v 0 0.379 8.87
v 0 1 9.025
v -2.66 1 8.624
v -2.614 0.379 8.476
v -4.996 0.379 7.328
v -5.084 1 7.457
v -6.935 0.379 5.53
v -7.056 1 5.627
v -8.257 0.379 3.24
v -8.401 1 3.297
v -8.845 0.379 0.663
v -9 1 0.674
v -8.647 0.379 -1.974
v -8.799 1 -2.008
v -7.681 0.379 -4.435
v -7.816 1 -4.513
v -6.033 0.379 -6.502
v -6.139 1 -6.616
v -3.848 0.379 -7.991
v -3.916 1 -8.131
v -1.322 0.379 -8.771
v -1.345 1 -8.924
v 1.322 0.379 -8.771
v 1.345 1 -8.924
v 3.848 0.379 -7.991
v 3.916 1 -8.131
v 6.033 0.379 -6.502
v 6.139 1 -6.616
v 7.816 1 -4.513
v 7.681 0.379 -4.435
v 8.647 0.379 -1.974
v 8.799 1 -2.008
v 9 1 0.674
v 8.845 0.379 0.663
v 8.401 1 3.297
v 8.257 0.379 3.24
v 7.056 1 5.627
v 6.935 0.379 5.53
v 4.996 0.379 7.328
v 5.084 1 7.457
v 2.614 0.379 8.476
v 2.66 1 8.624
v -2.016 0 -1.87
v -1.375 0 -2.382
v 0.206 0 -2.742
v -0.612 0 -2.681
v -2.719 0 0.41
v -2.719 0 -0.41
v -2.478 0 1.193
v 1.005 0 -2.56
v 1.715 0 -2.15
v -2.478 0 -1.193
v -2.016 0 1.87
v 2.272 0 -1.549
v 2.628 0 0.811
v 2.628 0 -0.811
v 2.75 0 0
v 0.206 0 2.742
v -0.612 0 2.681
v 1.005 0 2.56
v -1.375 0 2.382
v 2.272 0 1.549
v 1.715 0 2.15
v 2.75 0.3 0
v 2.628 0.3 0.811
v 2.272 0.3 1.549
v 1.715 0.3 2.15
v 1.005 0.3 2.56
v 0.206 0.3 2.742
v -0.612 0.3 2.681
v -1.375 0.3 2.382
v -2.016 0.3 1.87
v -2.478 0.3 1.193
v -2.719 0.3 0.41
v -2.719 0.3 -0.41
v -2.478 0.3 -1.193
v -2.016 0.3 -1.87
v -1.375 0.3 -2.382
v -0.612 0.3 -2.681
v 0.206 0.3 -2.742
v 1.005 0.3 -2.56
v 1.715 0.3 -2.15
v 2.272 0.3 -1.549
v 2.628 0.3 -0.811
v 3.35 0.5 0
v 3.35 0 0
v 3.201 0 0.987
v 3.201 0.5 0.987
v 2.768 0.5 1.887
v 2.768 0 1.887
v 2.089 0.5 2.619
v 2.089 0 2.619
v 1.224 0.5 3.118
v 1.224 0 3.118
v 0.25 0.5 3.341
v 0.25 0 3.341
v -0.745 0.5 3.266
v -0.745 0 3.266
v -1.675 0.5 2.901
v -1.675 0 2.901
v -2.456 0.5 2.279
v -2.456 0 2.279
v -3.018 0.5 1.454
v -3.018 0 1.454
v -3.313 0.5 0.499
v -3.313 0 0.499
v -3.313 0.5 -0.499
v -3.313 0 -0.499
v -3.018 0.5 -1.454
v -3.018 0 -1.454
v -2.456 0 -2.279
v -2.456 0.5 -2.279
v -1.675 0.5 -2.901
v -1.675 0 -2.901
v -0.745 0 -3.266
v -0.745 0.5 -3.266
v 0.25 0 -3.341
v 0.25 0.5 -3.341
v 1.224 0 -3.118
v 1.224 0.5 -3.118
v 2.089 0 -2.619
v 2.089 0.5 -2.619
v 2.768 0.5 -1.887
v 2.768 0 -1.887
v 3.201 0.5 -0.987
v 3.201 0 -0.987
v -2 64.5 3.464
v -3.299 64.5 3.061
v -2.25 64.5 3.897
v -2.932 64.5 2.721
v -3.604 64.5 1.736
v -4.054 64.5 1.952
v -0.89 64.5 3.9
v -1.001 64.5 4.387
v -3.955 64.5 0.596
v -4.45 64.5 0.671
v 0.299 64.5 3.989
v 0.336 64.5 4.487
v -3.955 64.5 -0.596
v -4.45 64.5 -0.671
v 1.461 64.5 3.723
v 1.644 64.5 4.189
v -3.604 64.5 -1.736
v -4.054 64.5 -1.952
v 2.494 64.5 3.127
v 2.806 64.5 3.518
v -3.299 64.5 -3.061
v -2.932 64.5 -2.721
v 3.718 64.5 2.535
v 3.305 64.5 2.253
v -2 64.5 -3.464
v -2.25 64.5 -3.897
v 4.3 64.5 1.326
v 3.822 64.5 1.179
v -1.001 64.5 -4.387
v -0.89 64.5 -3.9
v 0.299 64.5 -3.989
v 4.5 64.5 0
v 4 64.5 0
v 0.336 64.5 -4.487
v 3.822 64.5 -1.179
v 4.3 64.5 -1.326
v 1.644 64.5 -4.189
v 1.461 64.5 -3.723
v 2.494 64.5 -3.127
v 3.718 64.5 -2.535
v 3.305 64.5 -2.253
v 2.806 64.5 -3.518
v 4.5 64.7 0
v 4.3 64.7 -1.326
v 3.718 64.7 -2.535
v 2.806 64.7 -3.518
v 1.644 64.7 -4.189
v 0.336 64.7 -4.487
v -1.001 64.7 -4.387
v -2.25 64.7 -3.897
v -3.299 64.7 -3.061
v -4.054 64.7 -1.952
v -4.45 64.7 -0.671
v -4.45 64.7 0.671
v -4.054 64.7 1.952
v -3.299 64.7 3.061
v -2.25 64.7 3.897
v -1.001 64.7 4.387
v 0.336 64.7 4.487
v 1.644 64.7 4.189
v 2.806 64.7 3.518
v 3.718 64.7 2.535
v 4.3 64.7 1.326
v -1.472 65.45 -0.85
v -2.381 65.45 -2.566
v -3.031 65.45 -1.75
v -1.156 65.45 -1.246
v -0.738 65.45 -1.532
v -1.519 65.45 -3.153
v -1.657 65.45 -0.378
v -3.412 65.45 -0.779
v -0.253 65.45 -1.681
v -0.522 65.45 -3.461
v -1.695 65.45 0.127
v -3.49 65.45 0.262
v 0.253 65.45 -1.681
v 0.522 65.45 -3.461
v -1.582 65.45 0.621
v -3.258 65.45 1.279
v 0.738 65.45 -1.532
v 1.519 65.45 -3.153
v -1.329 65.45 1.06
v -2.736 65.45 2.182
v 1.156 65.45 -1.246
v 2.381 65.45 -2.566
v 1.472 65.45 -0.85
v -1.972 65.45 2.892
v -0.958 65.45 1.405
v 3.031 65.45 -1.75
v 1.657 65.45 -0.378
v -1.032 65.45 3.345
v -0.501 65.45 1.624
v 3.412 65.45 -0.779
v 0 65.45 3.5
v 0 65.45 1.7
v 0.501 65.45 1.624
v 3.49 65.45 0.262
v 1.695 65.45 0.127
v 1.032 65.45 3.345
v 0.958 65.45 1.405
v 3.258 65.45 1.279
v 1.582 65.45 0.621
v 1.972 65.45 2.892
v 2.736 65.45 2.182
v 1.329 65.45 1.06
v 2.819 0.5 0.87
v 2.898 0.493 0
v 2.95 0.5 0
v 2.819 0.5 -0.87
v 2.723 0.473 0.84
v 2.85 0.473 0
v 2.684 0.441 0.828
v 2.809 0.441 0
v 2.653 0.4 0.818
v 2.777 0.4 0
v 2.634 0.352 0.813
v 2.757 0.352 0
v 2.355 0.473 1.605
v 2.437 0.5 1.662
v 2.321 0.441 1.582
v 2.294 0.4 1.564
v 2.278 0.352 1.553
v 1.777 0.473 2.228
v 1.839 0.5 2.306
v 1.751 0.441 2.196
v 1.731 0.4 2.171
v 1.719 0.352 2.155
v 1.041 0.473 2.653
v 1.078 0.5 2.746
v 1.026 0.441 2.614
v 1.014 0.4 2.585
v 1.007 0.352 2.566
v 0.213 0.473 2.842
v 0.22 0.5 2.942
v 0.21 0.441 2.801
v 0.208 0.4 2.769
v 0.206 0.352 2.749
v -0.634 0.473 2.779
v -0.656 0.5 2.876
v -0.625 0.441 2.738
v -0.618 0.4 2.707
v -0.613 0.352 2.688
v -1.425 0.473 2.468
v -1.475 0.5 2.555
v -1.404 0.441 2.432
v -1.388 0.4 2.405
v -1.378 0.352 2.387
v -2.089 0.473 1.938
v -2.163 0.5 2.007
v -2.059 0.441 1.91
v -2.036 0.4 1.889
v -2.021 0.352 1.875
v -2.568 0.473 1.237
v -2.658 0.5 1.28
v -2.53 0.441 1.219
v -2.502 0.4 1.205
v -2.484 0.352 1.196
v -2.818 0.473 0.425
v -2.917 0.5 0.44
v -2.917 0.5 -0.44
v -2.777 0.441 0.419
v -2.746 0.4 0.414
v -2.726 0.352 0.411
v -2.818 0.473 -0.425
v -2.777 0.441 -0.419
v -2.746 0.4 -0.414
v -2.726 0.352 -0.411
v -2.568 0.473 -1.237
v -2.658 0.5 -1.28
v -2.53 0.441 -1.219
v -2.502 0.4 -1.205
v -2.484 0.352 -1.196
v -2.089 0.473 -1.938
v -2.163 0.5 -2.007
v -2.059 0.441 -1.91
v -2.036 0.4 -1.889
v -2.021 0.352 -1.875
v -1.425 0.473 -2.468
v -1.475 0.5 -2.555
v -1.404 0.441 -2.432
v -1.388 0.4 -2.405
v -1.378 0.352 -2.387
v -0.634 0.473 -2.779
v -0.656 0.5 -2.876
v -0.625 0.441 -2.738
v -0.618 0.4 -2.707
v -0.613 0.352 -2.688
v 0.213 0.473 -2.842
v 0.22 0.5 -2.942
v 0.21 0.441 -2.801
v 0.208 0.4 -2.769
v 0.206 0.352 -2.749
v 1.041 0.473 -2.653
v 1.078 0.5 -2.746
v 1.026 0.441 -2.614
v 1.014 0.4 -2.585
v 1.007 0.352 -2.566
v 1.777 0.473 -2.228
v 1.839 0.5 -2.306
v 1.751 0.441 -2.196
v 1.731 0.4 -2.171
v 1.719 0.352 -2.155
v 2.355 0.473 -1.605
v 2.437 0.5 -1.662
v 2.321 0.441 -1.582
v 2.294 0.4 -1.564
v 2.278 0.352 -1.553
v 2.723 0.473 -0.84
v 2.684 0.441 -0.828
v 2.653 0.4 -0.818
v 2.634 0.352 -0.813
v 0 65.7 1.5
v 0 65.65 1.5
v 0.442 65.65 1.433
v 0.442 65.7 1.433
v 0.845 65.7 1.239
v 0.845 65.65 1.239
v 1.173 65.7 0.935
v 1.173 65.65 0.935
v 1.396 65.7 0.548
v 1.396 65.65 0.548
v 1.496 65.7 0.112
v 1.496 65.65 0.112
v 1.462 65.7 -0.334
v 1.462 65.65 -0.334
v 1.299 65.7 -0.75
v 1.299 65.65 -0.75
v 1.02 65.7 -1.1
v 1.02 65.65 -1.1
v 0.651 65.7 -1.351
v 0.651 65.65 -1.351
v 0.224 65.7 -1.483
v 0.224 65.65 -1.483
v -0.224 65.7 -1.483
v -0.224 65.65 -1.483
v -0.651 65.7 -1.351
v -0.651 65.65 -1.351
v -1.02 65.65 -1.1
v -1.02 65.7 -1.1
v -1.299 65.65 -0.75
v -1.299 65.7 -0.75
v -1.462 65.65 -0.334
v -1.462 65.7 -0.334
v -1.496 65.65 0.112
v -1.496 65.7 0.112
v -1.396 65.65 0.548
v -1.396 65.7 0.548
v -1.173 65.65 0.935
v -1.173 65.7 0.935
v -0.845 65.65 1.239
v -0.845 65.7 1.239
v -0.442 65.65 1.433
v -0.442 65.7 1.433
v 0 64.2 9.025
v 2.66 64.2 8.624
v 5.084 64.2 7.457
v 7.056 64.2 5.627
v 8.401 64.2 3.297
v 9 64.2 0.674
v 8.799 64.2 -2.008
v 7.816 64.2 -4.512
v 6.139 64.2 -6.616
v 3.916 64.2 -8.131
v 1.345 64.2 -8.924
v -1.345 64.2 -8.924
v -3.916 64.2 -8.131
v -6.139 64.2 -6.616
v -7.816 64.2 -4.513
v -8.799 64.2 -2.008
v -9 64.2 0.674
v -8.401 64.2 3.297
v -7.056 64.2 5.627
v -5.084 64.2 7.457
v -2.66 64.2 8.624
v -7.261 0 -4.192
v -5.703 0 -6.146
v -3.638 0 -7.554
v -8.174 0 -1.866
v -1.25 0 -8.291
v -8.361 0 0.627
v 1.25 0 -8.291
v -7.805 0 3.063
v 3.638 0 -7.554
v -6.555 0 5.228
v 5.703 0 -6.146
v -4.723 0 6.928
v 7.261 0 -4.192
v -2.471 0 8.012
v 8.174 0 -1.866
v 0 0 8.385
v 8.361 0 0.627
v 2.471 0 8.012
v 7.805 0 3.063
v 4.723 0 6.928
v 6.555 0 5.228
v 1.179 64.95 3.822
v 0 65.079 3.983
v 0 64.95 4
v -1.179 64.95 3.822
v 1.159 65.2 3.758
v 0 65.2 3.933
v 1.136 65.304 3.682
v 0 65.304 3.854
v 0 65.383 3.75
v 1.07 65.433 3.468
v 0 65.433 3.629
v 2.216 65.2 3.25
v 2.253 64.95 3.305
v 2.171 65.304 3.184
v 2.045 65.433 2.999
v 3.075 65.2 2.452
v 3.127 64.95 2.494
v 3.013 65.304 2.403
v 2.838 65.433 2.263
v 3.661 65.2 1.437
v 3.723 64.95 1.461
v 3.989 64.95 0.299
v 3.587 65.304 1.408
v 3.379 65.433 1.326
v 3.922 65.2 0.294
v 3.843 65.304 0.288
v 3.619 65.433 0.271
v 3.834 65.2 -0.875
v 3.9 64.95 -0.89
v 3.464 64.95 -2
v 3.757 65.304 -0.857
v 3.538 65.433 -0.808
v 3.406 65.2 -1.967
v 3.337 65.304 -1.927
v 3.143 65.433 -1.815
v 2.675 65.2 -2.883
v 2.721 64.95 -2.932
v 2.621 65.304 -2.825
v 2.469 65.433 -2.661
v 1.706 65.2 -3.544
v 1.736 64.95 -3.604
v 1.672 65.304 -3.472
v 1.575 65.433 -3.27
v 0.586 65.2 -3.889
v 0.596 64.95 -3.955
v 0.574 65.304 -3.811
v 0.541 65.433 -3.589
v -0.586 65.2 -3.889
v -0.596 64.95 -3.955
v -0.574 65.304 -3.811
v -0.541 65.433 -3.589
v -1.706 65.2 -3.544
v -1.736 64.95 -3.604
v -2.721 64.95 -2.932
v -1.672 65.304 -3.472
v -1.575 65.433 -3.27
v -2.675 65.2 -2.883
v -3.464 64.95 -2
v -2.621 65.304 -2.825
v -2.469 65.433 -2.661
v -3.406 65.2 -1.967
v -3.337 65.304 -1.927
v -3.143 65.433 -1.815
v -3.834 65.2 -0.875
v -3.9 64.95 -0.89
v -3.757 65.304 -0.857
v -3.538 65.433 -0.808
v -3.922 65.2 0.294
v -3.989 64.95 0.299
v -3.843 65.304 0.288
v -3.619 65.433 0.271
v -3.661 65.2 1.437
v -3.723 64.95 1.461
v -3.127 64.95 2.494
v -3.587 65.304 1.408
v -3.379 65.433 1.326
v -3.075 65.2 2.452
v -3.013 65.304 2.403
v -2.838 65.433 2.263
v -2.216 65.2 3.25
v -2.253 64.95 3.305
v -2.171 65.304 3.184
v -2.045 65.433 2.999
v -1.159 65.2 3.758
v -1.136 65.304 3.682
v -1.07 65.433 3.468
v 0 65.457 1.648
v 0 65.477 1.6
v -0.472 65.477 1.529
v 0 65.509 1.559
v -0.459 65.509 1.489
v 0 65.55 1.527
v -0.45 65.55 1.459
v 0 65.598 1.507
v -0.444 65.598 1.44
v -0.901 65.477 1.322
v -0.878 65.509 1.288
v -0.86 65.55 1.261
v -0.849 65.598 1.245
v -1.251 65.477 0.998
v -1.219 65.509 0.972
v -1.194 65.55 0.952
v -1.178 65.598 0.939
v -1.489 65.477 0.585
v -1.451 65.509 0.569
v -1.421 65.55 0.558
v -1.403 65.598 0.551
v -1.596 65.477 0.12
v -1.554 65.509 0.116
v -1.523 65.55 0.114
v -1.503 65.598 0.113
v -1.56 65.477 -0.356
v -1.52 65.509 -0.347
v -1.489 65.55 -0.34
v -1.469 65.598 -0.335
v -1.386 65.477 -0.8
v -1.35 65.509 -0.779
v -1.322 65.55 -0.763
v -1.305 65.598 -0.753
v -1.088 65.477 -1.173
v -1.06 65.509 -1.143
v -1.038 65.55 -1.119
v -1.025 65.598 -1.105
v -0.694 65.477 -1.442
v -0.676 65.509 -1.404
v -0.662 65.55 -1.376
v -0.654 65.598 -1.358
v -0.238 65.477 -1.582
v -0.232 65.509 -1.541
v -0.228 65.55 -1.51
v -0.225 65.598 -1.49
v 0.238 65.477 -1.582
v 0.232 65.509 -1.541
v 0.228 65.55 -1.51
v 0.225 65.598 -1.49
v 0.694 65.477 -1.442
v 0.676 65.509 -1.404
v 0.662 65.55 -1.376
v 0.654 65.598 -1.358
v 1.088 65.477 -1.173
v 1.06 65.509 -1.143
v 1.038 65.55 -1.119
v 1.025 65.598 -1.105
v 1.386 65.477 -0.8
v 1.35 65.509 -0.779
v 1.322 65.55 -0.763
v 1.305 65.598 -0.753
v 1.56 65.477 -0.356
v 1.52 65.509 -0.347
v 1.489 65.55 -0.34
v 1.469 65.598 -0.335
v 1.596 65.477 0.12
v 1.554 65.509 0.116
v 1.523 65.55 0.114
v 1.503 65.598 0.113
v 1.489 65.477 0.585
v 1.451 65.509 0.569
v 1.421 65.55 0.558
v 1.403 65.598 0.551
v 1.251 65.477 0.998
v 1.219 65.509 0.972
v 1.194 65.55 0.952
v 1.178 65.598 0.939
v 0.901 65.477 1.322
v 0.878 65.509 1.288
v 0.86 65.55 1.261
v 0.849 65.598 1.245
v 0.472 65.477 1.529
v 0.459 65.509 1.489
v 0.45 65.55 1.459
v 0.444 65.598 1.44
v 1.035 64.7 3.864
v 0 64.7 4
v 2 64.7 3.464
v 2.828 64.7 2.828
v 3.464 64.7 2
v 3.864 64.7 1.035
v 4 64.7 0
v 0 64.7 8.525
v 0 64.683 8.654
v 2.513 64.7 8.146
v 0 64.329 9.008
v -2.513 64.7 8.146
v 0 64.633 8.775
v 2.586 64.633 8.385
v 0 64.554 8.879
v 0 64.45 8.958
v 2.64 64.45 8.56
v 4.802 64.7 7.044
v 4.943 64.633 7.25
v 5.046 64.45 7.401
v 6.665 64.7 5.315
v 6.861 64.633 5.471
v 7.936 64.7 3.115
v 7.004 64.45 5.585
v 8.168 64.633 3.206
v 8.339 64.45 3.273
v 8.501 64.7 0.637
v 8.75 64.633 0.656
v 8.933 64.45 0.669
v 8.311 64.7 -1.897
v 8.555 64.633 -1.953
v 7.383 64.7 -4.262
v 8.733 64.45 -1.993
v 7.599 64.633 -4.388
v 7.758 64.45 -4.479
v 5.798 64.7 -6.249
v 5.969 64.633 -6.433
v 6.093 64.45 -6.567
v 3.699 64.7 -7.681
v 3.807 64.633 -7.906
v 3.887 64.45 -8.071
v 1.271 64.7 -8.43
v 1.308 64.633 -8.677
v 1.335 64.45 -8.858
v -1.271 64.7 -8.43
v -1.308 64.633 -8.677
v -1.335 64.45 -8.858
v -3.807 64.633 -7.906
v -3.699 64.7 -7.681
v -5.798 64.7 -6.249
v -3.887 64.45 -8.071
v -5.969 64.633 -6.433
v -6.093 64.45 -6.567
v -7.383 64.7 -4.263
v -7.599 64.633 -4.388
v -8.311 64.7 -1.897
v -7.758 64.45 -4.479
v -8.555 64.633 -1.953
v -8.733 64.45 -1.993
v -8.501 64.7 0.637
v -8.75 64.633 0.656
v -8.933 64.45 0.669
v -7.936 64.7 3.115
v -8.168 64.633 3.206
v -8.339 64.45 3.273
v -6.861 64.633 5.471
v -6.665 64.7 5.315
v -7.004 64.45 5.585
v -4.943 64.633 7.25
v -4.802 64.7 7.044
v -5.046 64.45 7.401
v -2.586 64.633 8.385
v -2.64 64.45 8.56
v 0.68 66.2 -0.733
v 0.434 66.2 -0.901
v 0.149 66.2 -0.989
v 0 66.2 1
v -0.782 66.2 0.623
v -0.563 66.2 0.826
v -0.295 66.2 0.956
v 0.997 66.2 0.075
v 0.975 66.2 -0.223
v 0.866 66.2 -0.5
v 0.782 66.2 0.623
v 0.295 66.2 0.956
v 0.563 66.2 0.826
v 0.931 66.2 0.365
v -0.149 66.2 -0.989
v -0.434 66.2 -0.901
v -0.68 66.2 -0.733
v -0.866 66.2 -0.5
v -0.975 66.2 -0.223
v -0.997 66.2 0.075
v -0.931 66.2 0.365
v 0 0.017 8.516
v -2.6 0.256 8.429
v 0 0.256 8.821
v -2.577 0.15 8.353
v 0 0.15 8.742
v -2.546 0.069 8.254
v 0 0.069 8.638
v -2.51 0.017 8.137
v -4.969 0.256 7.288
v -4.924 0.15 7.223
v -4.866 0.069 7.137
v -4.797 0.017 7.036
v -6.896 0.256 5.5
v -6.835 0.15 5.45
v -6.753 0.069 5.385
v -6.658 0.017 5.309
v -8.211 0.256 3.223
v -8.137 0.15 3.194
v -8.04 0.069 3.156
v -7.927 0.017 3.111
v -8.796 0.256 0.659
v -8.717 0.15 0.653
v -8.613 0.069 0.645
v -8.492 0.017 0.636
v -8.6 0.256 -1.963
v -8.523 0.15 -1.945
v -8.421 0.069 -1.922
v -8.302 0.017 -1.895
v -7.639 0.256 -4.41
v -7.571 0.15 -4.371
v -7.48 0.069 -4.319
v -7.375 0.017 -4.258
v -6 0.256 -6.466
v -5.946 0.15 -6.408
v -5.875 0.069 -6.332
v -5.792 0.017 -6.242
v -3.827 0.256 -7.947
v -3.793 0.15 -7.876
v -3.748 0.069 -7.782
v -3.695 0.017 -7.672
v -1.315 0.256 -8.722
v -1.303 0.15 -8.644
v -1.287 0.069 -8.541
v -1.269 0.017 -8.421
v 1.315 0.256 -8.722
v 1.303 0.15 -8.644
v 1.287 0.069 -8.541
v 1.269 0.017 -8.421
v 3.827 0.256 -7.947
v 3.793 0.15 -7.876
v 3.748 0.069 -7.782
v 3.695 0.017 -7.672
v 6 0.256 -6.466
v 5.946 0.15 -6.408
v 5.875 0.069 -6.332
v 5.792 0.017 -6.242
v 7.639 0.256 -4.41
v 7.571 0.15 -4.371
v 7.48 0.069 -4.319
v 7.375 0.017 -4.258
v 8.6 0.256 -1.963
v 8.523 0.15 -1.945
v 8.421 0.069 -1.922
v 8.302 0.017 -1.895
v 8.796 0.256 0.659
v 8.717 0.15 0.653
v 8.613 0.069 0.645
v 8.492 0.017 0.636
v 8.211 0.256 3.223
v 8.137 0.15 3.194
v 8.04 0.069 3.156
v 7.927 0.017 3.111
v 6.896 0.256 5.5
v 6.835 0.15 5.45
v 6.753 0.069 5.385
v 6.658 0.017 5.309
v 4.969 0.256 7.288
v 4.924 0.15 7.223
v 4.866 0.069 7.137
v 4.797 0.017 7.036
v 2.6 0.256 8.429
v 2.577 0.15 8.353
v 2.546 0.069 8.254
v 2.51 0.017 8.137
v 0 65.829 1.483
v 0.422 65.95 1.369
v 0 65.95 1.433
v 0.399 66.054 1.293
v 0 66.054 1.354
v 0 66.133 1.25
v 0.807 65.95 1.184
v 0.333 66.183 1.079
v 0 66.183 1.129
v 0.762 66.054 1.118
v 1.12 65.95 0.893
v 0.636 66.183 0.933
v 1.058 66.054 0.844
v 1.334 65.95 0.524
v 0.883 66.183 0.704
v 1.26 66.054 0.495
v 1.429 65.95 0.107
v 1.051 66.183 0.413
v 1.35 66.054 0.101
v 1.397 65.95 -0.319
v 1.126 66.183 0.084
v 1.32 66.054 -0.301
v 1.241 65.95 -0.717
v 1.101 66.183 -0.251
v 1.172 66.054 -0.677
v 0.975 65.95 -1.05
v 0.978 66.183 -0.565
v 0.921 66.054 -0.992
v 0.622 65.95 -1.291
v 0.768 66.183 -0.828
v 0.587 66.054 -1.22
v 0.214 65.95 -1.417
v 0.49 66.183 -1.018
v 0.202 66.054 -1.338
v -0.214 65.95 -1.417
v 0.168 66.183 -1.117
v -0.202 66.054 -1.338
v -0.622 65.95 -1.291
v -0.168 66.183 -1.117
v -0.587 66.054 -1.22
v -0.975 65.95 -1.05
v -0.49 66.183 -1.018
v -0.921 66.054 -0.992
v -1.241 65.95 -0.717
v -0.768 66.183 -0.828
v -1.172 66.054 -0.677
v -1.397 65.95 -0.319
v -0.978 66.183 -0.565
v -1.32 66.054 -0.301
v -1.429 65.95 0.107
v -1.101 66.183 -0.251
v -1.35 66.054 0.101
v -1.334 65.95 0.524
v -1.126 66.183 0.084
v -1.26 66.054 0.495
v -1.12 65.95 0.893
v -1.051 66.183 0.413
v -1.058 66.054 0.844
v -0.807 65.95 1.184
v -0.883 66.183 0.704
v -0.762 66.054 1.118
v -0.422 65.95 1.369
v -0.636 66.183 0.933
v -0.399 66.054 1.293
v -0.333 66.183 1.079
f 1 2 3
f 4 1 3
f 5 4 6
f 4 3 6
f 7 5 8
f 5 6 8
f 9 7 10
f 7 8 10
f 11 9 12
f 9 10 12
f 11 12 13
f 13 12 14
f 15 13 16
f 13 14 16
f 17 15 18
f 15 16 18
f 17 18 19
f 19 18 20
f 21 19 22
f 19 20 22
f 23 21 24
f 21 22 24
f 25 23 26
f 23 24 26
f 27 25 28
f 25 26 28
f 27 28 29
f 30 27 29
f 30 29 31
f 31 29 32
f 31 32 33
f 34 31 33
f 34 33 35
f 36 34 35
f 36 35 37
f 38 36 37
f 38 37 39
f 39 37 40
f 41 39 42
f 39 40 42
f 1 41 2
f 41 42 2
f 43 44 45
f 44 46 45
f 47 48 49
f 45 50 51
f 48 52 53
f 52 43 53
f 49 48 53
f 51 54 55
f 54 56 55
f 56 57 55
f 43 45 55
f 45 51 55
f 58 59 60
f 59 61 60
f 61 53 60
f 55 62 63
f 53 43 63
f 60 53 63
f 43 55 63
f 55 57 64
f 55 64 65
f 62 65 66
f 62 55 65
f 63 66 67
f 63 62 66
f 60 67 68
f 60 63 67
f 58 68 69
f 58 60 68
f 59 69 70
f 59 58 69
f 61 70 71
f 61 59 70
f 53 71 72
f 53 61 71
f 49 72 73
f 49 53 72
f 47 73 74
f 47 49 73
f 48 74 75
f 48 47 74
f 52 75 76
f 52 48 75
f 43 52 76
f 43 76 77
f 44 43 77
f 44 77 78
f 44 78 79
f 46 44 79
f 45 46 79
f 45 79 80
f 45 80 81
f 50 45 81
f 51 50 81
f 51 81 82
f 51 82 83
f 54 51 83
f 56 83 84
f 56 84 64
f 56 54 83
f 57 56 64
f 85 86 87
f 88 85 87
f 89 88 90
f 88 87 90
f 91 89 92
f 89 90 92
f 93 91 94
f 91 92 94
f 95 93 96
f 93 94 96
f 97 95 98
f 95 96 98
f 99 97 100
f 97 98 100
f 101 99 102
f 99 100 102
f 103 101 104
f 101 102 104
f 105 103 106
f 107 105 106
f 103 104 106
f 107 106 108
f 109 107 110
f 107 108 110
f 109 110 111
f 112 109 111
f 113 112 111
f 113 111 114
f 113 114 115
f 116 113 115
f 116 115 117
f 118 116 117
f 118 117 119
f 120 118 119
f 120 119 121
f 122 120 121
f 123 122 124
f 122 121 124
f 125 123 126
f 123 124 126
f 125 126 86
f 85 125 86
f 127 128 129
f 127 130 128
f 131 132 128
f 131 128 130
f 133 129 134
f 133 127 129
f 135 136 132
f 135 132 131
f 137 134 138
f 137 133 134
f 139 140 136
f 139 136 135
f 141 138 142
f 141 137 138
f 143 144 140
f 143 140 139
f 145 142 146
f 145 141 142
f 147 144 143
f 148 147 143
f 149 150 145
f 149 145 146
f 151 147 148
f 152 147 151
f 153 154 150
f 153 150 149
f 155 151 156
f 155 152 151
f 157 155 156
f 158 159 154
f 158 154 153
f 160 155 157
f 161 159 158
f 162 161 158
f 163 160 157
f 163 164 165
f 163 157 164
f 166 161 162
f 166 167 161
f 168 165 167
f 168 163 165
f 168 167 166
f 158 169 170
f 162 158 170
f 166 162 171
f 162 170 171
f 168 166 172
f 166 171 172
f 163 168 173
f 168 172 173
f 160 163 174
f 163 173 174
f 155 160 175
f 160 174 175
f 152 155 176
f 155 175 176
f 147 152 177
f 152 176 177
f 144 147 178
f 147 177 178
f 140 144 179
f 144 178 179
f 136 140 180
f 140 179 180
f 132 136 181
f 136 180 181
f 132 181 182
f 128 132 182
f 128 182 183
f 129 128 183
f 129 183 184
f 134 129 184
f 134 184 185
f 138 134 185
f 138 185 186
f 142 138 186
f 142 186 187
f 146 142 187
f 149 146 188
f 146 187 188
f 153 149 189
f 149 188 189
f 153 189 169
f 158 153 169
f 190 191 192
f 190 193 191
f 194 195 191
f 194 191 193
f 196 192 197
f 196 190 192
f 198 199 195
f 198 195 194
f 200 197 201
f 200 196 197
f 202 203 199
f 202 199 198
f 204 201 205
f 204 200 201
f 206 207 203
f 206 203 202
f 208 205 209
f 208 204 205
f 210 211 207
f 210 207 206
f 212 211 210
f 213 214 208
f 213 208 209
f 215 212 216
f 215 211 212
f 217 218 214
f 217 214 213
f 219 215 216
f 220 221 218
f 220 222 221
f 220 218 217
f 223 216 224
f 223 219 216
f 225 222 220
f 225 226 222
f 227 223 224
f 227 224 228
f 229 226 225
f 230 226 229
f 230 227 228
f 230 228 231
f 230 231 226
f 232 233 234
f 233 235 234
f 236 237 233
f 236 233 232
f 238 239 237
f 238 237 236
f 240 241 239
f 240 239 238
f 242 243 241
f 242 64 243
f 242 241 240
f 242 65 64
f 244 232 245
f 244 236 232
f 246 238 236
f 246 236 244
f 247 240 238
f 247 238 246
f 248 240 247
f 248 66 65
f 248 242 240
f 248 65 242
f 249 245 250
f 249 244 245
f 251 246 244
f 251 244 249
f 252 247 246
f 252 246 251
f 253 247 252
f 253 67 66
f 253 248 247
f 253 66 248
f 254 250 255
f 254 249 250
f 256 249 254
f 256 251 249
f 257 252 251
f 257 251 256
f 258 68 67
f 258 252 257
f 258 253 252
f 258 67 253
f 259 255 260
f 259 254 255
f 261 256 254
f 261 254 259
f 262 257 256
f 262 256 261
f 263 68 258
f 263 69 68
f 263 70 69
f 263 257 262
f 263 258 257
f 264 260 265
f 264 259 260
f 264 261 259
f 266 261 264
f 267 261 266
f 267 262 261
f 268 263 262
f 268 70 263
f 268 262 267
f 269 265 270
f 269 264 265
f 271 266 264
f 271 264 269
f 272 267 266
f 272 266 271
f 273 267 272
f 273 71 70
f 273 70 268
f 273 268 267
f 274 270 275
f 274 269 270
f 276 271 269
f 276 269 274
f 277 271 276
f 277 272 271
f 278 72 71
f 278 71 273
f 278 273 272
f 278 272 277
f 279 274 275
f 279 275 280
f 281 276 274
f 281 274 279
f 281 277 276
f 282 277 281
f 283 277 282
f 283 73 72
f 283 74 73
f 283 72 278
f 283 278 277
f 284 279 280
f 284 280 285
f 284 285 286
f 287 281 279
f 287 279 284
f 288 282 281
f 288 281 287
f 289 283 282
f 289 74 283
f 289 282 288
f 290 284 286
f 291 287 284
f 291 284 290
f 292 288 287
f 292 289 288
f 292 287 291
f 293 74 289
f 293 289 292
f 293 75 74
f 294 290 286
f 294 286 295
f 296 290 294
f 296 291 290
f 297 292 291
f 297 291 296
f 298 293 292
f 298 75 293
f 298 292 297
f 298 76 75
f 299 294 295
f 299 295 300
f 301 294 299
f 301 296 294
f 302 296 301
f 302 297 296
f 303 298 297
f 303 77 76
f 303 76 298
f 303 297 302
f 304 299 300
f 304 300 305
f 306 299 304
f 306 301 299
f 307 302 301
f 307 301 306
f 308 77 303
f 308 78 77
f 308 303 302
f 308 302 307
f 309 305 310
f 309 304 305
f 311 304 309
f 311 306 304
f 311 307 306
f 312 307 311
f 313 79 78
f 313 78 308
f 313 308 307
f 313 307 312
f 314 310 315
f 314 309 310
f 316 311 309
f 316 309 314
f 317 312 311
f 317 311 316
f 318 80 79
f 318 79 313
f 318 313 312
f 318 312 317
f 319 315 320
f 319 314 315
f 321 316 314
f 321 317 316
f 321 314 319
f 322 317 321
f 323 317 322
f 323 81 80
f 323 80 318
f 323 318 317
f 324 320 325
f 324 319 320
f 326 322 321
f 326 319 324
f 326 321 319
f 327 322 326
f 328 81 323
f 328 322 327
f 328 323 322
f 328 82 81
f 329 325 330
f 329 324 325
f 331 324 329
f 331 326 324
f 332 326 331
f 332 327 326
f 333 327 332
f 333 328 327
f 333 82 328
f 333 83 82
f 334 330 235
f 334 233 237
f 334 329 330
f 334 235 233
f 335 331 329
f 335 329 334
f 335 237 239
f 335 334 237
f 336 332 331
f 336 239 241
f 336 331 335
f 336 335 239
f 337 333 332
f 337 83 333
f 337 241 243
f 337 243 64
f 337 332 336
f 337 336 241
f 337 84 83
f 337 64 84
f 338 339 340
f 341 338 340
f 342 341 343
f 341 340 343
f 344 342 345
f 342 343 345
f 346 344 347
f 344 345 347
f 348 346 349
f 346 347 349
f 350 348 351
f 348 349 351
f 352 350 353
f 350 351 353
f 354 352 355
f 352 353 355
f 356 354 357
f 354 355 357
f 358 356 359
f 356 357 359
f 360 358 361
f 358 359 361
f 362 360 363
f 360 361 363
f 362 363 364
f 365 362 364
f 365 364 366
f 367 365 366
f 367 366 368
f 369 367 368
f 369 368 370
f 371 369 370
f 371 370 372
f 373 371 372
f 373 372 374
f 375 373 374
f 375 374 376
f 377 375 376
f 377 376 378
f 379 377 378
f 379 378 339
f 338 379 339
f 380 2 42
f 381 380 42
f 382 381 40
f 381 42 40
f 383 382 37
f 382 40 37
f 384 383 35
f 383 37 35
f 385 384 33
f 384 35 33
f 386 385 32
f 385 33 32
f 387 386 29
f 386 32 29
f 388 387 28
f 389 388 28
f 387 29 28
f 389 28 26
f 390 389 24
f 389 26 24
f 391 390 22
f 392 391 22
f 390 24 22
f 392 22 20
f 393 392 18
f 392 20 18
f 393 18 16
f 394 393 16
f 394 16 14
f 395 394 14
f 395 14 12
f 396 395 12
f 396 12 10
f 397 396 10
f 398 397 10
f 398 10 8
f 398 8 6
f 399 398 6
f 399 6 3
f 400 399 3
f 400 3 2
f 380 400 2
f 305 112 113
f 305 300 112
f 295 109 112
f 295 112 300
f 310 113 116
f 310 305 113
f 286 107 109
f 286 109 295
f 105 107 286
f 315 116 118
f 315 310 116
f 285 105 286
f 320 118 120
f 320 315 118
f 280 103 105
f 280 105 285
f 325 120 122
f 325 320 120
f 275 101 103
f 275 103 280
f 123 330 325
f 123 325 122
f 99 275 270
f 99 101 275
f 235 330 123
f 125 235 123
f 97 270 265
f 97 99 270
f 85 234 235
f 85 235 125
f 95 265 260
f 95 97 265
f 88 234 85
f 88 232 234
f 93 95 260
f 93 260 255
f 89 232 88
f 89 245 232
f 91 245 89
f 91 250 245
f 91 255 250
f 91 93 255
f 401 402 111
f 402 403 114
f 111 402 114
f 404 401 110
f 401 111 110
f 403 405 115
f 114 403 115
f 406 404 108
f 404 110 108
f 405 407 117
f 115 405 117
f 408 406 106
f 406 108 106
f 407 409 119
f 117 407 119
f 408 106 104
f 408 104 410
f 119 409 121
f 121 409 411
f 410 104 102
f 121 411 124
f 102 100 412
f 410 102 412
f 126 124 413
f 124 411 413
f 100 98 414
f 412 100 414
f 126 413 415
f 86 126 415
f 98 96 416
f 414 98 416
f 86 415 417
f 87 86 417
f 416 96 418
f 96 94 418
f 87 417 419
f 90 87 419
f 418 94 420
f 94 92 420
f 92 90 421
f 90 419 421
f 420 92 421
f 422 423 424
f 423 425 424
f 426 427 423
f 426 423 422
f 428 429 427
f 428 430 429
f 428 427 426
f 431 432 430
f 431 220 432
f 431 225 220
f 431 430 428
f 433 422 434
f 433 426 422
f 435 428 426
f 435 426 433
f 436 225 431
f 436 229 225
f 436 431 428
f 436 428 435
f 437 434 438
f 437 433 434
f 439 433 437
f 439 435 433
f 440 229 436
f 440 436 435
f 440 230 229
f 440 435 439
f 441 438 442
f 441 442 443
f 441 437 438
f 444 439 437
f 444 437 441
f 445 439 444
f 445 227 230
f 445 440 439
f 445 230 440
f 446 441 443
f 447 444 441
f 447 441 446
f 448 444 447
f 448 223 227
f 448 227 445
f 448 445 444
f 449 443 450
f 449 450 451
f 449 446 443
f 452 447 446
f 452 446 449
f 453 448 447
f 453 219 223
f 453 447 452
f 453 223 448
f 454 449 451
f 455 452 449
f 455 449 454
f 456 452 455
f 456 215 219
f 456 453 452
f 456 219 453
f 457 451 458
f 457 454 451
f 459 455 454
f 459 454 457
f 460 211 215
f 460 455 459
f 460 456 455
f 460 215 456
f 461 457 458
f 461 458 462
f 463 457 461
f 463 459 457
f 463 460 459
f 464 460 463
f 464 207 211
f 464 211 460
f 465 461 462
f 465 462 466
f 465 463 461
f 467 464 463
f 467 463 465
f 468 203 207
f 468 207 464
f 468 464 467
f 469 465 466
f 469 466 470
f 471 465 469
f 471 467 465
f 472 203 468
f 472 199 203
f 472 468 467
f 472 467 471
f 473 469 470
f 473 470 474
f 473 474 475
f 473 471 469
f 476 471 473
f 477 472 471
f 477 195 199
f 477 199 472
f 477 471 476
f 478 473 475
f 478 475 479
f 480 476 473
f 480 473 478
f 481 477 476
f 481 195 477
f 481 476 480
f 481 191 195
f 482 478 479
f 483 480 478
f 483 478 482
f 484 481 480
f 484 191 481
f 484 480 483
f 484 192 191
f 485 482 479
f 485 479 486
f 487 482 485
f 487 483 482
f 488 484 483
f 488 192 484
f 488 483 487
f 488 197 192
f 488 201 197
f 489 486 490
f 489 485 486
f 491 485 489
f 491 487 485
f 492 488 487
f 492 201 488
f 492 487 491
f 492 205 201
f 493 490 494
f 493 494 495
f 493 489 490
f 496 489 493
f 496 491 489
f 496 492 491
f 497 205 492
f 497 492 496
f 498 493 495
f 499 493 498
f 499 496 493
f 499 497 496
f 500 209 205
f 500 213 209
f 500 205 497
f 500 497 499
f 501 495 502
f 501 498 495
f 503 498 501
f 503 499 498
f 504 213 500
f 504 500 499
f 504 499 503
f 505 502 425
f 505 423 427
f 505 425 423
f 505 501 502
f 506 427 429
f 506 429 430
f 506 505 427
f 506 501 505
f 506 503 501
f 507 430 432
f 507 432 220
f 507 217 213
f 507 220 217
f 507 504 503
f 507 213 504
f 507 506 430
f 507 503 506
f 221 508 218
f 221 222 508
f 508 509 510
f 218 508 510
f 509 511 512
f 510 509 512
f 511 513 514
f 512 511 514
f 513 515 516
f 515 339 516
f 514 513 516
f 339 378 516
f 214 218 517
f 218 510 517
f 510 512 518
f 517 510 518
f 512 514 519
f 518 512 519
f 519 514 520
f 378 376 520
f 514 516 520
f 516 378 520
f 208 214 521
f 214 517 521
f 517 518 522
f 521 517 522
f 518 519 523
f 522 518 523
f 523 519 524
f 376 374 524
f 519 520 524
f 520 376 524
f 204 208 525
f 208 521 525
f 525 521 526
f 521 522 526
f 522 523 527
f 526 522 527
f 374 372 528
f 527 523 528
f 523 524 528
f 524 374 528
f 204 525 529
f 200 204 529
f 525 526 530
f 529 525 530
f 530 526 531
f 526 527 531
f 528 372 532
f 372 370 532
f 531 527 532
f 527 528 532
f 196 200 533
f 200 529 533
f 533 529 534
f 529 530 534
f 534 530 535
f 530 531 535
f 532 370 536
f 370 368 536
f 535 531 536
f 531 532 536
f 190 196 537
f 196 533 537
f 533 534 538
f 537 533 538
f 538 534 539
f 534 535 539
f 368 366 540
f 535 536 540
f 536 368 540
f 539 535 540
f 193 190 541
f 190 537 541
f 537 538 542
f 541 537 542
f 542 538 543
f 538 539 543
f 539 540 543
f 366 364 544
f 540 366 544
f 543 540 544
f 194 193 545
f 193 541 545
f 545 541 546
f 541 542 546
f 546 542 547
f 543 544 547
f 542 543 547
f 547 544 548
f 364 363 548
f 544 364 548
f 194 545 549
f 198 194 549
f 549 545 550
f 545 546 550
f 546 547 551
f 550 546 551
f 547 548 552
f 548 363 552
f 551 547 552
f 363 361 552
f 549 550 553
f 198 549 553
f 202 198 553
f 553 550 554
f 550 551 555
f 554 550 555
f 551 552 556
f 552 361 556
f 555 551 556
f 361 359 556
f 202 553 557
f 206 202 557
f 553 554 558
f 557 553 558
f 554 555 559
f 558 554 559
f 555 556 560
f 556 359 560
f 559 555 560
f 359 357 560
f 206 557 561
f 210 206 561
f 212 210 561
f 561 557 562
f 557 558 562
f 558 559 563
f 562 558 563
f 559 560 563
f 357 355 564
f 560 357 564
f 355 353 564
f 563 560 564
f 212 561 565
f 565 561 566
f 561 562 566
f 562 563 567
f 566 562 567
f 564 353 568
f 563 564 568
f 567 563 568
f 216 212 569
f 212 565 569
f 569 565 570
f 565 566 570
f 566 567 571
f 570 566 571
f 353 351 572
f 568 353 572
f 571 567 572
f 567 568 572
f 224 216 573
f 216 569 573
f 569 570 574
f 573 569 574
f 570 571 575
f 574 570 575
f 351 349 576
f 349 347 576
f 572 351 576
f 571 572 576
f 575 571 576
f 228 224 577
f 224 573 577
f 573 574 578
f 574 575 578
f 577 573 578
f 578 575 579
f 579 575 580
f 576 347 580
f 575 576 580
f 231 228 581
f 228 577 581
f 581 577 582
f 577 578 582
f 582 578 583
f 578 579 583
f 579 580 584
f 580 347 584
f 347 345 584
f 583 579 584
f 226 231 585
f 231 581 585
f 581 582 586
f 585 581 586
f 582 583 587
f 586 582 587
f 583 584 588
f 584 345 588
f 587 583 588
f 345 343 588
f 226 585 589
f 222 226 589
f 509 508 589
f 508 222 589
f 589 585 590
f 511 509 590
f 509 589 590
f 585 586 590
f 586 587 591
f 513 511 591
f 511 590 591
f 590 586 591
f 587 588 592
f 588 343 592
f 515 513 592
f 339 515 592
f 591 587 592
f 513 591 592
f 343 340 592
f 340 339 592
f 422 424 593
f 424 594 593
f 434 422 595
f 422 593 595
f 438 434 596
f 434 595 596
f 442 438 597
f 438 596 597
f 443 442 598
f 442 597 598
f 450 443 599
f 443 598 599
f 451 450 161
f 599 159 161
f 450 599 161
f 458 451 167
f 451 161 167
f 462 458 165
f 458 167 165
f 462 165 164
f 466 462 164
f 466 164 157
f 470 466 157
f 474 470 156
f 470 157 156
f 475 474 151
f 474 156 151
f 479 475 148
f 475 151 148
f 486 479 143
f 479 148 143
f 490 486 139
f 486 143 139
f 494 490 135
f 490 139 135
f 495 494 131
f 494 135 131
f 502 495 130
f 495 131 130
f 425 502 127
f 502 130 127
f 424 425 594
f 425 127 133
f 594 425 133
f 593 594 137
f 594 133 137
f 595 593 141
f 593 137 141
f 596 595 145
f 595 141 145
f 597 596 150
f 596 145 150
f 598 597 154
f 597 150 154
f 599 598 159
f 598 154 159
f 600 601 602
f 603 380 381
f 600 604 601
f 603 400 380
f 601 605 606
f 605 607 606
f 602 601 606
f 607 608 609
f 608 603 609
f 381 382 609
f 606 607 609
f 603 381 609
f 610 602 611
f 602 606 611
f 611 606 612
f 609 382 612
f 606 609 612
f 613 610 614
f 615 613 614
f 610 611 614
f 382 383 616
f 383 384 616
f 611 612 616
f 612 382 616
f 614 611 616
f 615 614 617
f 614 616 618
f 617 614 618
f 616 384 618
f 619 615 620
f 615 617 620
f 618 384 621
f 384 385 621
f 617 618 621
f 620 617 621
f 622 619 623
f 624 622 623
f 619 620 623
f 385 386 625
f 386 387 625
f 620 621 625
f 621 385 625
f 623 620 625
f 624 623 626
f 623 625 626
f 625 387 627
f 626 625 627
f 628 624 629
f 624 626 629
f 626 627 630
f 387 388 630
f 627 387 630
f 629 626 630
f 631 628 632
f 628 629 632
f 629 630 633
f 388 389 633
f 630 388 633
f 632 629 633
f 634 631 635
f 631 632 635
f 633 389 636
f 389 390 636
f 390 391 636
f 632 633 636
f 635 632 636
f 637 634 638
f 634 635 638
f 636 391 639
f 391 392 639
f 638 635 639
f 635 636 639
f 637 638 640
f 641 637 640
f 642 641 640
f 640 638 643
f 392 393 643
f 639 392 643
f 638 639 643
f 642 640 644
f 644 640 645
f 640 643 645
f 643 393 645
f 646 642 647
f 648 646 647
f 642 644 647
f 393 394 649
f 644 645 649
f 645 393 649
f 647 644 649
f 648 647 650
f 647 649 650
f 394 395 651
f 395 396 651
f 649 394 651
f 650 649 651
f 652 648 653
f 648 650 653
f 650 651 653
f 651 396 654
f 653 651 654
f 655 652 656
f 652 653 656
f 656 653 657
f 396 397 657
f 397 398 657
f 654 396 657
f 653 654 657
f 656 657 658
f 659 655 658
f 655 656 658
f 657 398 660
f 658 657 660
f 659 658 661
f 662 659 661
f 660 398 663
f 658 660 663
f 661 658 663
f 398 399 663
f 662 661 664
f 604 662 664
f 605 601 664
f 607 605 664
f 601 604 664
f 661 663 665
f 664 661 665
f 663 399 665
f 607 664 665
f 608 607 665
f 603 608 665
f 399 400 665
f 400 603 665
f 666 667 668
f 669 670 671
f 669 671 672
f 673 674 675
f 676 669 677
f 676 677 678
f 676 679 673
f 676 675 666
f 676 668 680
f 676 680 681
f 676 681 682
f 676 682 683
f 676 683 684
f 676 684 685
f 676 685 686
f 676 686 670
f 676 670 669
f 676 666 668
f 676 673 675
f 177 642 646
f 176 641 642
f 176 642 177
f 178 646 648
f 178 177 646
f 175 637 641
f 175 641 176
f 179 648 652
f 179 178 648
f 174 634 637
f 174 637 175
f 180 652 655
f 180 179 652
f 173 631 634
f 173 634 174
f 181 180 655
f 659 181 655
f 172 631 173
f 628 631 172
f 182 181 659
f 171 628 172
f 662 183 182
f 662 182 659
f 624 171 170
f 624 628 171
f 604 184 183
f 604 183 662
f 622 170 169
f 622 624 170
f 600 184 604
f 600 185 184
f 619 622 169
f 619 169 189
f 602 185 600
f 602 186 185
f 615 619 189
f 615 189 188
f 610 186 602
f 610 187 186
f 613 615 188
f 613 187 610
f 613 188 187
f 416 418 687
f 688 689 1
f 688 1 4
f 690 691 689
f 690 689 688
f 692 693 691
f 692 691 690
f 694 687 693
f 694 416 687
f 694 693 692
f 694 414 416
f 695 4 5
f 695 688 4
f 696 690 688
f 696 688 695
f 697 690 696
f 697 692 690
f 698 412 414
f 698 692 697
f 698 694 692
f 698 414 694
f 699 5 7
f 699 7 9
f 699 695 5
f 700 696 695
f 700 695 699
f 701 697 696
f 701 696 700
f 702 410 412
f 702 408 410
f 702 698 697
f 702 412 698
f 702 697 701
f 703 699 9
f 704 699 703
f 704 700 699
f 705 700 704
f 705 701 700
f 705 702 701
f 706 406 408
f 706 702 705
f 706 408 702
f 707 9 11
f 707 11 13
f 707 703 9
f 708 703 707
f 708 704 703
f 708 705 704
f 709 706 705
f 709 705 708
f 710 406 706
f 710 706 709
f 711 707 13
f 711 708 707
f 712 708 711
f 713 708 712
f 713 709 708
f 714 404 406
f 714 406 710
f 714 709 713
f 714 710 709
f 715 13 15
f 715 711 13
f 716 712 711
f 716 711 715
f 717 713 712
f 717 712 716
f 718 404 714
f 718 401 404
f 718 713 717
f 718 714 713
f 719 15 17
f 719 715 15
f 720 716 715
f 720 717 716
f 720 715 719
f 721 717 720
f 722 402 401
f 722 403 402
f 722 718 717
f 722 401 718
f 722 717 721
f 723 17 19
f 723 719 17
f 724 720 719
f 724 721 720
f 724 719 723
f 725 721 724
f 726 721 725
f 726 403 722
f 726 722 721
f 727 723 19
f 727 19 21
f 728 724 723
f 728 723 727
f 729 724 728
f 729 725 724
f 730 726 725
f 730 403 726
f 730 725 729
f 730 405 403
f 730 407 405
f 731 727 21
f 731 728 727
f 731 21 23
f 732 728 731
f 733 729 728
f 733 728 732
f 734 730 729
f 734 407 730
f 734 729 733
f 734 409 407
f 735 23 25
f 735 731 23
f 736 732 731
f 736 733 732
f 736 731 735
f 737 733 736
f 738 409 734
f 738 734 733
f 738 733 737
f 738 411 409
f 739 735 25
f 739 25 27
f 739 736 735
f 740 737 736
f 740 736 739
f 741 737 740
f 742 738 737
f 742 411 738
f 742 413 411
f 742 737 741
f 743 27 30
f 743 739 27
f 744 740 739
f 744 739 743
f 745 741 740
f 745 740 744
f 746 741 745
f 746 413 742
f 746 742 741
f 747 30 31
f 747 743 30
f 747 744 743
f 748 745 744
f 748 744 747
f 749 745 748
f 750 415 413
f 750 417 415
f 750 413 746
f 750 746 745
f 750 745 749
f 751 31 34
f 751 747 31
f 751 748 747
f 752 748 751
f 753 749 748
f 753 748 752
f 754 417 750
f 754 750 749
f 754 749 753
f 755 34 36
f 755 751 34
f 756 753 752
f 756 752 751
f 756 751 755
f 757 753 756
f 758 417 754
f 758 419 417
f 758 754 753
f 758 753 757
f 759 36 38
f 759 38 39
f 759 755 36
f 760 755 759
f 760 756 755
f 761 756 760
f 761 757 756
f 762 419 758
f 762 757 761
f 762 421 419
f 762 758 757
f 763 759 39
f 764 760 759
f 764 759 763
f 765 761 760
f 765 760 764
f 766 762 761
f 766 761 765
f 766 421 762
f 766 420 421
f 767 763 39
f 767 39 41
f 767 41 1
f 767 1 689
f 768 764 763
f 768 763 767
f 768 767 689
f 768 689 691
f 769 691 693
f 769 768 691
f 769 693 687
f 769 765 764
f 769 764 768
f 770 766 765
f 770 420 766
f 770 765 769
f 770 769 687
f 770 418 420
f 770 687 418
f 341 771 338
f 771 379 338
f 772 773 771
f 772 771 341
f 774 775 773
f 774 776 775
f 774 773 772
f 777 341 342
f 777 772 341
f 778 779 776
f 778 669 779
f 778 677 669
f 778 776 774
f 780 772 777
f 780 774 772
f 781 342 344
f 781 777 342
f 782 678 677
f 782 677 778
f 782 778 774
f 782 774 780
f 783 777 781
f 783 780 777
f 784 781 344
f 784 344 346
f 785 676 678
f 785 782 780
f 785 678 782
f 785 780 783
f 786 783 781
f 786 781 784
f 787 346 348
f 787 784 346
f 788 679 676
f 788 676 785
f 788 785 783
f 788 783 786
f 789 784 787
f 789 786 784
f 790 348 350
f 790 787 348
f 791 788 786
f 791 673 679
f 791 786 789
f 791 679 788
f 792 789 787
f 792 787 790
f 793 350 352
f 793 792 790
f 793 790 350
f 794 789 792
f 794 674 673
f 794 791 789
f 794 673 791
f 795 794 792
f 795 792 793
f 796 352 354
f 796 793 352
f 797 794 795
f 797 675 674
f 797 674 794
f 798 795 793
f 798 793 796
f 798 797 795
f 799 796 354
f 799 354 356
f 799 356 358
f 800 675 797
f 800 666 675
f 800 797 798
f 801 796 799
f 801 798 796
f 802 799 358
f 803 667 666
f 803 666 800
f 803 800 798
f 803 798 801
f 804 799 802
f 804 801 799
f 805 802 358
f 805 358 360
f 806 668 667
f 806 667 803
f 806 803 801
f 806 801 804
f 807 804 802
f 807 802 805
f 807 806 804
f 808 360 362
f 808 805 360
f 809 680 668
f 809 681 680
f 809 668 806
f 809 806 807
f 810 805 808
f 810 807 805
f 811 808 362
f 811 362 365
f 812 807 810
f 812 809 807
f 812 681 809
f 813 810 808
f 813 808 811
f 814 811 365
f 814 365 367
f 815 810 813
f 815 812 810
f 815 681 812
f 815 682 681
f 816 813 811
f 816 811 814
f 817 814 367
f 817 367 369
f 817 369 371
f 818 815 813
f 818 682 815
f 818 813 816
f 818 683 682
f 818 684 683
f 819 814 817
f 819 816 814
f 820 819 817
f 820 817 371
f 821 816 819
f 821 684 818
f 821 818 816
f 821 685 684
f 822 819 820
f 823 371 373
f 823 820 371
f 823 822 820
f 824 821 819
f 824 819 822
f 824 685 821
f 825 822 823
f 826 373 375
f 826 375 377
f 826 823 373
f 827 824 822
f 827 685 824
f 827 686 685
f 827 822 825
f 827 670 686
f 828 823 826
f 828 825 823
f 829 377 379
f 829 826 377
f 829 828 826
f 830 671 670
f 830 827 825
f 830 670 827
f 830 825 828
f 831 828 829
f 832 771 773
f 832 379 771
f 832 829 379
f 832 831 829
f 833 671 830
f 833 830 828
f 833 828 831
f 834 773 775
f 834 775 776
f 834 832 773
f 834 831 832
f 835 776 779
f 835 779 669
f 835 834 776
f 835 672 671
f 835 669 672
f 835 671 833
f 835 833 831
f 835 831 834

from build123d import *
from build123d.topology import SkipClean

# Parameters (mm, degrees)
SKETCH1_R      = 9.025
BASE_DEPTH     = 64.7
SKETCH7_R      = 4.5
SKETCH7_R_2    = 4
RIM_DEPTH      = 0.2
SKETCH2_R      = 1.5
TERMINAL_DEPTH = 1.5
SKETCH6_R      = 4
STEP_DEPTH     = 0.75
SKETCH3_R      = 3.35
SKETCH3_R_2    = 2.75
RIM_2_DEPTH    = 0.5
OUTER_FILLET_R = 0.5
INNER_FILLET_R = 0.2


with BuildPart() as part:
    # Sketch1 → Base (new body)
    with BuildSketch(Plane(origin=(0, 0, 0), x_dir=(1, 0, 0), z_dir=(0, 1, 0))):
        with Locations(Location((0, 0, 0), (0, 0, 270))):  # turned: the seam where the file's is
            Circle(SKETCH1_R)
    extrude(amount=BASE_DEPTH)

    # Sketch7 → Rim (cut)
    with BuildSketch(Plane(origin=(0, 64.7, 0), x_dir=(1, 0, 0), z_dir=(0, 1, 0))):
        Circle(SKETCH7_R)
        Circle(SKETCH7_R_2, mode=Mode.SUBTRACT)
    extrude(amount=-RIM_DEPTH, mode=Mode.SUBTRACT)

    # Sketch2 → Terminal (add)
    with BuildSketch(Plane(origin=(0, 64.7, 0), x_dir=(1, 0, 0), z_dir=(0, 1, 0))):
        with Locations(Location((0, 0, 0), (0, 0, 270))):  # turned: the seam where the file's is
            Circle(SKETCH2_R)
    extrude(amount=TERMINAL_DEPTH)

    # Sketch6 → Step (add)
    with SkipClean():  # keep this step's faces unmerged: merging them makes the solid invalid here
        with BuildSketch(Plane(origin=(0, 64.7, 0), x_dir=(1, 0, 0), z_dir=(0, 1, 0))):
            with Locations(Location((0, 0, 0), (0, 0, 270))):  # turned: the seam where the file's is
                Circle(SKETCH6_R)
        extrude(amount=STEP_DEPTH)

    # Sketch8 → Drop Off (revolve, cut)
    with SkipClean():  # keep this step's faces unmerged: merging them makes the solid invalid here
        with BuildSketch(Plane(origin=(0, 0, 0), x_dir=(0, 0, -1), z_dir=(1, 0, 0)), mode=Mode.PRIVATE) as drop_off_sk:
            Polygon((9.025, 1), (9.025, 0), (8.775, 0), align=None)
        revolve(drop_off_sk.sketch.rotate(Axis((0, 64.7, 0), (0, -1, 0)), 180), axis=Axis((0, 64.7, 0), (0, -1, 0)), mode=Mode.SUBTRACT)  # turned: the seam where the file's is

    # Sketch3 → Rim 2 (cut)
    with SkipClean():  # keep this step's faces unmerged: merging them makes the solid invalid here
        with BuildSketch(Plane.XZ):
            Circle(SKETCH3_R)
            Circle(SKETCH3_R_2, mode=Mode.SUBTRACT)
        extrude(amount=-RIM_2_DEPTH, mode=Mode.SUBTRACT)

    # Outer Fillet
    outer_fillet_edges = [part.edges().sort_by_distance(p)[0] for p in [
        (0, 66.2, -1.5),
        (0, 65.45, -4),
        (0, 0, -8.775),
        (0, 64.7, -9.025),
    ]]
    fillet(outer_fillet_edges, radius=OUTER_FILLET_R)

    # Inner Fillet
    inner_fillet_edges = [part.edges().sort_by_distance(p)[0] for p in [
        (0, 65.45, -1.5),
        (-2.75, 0.5, 0),
    ]]
    fillet(inner_fillet_edges, radius=INNER_FILLET_R)


solid = part.part
